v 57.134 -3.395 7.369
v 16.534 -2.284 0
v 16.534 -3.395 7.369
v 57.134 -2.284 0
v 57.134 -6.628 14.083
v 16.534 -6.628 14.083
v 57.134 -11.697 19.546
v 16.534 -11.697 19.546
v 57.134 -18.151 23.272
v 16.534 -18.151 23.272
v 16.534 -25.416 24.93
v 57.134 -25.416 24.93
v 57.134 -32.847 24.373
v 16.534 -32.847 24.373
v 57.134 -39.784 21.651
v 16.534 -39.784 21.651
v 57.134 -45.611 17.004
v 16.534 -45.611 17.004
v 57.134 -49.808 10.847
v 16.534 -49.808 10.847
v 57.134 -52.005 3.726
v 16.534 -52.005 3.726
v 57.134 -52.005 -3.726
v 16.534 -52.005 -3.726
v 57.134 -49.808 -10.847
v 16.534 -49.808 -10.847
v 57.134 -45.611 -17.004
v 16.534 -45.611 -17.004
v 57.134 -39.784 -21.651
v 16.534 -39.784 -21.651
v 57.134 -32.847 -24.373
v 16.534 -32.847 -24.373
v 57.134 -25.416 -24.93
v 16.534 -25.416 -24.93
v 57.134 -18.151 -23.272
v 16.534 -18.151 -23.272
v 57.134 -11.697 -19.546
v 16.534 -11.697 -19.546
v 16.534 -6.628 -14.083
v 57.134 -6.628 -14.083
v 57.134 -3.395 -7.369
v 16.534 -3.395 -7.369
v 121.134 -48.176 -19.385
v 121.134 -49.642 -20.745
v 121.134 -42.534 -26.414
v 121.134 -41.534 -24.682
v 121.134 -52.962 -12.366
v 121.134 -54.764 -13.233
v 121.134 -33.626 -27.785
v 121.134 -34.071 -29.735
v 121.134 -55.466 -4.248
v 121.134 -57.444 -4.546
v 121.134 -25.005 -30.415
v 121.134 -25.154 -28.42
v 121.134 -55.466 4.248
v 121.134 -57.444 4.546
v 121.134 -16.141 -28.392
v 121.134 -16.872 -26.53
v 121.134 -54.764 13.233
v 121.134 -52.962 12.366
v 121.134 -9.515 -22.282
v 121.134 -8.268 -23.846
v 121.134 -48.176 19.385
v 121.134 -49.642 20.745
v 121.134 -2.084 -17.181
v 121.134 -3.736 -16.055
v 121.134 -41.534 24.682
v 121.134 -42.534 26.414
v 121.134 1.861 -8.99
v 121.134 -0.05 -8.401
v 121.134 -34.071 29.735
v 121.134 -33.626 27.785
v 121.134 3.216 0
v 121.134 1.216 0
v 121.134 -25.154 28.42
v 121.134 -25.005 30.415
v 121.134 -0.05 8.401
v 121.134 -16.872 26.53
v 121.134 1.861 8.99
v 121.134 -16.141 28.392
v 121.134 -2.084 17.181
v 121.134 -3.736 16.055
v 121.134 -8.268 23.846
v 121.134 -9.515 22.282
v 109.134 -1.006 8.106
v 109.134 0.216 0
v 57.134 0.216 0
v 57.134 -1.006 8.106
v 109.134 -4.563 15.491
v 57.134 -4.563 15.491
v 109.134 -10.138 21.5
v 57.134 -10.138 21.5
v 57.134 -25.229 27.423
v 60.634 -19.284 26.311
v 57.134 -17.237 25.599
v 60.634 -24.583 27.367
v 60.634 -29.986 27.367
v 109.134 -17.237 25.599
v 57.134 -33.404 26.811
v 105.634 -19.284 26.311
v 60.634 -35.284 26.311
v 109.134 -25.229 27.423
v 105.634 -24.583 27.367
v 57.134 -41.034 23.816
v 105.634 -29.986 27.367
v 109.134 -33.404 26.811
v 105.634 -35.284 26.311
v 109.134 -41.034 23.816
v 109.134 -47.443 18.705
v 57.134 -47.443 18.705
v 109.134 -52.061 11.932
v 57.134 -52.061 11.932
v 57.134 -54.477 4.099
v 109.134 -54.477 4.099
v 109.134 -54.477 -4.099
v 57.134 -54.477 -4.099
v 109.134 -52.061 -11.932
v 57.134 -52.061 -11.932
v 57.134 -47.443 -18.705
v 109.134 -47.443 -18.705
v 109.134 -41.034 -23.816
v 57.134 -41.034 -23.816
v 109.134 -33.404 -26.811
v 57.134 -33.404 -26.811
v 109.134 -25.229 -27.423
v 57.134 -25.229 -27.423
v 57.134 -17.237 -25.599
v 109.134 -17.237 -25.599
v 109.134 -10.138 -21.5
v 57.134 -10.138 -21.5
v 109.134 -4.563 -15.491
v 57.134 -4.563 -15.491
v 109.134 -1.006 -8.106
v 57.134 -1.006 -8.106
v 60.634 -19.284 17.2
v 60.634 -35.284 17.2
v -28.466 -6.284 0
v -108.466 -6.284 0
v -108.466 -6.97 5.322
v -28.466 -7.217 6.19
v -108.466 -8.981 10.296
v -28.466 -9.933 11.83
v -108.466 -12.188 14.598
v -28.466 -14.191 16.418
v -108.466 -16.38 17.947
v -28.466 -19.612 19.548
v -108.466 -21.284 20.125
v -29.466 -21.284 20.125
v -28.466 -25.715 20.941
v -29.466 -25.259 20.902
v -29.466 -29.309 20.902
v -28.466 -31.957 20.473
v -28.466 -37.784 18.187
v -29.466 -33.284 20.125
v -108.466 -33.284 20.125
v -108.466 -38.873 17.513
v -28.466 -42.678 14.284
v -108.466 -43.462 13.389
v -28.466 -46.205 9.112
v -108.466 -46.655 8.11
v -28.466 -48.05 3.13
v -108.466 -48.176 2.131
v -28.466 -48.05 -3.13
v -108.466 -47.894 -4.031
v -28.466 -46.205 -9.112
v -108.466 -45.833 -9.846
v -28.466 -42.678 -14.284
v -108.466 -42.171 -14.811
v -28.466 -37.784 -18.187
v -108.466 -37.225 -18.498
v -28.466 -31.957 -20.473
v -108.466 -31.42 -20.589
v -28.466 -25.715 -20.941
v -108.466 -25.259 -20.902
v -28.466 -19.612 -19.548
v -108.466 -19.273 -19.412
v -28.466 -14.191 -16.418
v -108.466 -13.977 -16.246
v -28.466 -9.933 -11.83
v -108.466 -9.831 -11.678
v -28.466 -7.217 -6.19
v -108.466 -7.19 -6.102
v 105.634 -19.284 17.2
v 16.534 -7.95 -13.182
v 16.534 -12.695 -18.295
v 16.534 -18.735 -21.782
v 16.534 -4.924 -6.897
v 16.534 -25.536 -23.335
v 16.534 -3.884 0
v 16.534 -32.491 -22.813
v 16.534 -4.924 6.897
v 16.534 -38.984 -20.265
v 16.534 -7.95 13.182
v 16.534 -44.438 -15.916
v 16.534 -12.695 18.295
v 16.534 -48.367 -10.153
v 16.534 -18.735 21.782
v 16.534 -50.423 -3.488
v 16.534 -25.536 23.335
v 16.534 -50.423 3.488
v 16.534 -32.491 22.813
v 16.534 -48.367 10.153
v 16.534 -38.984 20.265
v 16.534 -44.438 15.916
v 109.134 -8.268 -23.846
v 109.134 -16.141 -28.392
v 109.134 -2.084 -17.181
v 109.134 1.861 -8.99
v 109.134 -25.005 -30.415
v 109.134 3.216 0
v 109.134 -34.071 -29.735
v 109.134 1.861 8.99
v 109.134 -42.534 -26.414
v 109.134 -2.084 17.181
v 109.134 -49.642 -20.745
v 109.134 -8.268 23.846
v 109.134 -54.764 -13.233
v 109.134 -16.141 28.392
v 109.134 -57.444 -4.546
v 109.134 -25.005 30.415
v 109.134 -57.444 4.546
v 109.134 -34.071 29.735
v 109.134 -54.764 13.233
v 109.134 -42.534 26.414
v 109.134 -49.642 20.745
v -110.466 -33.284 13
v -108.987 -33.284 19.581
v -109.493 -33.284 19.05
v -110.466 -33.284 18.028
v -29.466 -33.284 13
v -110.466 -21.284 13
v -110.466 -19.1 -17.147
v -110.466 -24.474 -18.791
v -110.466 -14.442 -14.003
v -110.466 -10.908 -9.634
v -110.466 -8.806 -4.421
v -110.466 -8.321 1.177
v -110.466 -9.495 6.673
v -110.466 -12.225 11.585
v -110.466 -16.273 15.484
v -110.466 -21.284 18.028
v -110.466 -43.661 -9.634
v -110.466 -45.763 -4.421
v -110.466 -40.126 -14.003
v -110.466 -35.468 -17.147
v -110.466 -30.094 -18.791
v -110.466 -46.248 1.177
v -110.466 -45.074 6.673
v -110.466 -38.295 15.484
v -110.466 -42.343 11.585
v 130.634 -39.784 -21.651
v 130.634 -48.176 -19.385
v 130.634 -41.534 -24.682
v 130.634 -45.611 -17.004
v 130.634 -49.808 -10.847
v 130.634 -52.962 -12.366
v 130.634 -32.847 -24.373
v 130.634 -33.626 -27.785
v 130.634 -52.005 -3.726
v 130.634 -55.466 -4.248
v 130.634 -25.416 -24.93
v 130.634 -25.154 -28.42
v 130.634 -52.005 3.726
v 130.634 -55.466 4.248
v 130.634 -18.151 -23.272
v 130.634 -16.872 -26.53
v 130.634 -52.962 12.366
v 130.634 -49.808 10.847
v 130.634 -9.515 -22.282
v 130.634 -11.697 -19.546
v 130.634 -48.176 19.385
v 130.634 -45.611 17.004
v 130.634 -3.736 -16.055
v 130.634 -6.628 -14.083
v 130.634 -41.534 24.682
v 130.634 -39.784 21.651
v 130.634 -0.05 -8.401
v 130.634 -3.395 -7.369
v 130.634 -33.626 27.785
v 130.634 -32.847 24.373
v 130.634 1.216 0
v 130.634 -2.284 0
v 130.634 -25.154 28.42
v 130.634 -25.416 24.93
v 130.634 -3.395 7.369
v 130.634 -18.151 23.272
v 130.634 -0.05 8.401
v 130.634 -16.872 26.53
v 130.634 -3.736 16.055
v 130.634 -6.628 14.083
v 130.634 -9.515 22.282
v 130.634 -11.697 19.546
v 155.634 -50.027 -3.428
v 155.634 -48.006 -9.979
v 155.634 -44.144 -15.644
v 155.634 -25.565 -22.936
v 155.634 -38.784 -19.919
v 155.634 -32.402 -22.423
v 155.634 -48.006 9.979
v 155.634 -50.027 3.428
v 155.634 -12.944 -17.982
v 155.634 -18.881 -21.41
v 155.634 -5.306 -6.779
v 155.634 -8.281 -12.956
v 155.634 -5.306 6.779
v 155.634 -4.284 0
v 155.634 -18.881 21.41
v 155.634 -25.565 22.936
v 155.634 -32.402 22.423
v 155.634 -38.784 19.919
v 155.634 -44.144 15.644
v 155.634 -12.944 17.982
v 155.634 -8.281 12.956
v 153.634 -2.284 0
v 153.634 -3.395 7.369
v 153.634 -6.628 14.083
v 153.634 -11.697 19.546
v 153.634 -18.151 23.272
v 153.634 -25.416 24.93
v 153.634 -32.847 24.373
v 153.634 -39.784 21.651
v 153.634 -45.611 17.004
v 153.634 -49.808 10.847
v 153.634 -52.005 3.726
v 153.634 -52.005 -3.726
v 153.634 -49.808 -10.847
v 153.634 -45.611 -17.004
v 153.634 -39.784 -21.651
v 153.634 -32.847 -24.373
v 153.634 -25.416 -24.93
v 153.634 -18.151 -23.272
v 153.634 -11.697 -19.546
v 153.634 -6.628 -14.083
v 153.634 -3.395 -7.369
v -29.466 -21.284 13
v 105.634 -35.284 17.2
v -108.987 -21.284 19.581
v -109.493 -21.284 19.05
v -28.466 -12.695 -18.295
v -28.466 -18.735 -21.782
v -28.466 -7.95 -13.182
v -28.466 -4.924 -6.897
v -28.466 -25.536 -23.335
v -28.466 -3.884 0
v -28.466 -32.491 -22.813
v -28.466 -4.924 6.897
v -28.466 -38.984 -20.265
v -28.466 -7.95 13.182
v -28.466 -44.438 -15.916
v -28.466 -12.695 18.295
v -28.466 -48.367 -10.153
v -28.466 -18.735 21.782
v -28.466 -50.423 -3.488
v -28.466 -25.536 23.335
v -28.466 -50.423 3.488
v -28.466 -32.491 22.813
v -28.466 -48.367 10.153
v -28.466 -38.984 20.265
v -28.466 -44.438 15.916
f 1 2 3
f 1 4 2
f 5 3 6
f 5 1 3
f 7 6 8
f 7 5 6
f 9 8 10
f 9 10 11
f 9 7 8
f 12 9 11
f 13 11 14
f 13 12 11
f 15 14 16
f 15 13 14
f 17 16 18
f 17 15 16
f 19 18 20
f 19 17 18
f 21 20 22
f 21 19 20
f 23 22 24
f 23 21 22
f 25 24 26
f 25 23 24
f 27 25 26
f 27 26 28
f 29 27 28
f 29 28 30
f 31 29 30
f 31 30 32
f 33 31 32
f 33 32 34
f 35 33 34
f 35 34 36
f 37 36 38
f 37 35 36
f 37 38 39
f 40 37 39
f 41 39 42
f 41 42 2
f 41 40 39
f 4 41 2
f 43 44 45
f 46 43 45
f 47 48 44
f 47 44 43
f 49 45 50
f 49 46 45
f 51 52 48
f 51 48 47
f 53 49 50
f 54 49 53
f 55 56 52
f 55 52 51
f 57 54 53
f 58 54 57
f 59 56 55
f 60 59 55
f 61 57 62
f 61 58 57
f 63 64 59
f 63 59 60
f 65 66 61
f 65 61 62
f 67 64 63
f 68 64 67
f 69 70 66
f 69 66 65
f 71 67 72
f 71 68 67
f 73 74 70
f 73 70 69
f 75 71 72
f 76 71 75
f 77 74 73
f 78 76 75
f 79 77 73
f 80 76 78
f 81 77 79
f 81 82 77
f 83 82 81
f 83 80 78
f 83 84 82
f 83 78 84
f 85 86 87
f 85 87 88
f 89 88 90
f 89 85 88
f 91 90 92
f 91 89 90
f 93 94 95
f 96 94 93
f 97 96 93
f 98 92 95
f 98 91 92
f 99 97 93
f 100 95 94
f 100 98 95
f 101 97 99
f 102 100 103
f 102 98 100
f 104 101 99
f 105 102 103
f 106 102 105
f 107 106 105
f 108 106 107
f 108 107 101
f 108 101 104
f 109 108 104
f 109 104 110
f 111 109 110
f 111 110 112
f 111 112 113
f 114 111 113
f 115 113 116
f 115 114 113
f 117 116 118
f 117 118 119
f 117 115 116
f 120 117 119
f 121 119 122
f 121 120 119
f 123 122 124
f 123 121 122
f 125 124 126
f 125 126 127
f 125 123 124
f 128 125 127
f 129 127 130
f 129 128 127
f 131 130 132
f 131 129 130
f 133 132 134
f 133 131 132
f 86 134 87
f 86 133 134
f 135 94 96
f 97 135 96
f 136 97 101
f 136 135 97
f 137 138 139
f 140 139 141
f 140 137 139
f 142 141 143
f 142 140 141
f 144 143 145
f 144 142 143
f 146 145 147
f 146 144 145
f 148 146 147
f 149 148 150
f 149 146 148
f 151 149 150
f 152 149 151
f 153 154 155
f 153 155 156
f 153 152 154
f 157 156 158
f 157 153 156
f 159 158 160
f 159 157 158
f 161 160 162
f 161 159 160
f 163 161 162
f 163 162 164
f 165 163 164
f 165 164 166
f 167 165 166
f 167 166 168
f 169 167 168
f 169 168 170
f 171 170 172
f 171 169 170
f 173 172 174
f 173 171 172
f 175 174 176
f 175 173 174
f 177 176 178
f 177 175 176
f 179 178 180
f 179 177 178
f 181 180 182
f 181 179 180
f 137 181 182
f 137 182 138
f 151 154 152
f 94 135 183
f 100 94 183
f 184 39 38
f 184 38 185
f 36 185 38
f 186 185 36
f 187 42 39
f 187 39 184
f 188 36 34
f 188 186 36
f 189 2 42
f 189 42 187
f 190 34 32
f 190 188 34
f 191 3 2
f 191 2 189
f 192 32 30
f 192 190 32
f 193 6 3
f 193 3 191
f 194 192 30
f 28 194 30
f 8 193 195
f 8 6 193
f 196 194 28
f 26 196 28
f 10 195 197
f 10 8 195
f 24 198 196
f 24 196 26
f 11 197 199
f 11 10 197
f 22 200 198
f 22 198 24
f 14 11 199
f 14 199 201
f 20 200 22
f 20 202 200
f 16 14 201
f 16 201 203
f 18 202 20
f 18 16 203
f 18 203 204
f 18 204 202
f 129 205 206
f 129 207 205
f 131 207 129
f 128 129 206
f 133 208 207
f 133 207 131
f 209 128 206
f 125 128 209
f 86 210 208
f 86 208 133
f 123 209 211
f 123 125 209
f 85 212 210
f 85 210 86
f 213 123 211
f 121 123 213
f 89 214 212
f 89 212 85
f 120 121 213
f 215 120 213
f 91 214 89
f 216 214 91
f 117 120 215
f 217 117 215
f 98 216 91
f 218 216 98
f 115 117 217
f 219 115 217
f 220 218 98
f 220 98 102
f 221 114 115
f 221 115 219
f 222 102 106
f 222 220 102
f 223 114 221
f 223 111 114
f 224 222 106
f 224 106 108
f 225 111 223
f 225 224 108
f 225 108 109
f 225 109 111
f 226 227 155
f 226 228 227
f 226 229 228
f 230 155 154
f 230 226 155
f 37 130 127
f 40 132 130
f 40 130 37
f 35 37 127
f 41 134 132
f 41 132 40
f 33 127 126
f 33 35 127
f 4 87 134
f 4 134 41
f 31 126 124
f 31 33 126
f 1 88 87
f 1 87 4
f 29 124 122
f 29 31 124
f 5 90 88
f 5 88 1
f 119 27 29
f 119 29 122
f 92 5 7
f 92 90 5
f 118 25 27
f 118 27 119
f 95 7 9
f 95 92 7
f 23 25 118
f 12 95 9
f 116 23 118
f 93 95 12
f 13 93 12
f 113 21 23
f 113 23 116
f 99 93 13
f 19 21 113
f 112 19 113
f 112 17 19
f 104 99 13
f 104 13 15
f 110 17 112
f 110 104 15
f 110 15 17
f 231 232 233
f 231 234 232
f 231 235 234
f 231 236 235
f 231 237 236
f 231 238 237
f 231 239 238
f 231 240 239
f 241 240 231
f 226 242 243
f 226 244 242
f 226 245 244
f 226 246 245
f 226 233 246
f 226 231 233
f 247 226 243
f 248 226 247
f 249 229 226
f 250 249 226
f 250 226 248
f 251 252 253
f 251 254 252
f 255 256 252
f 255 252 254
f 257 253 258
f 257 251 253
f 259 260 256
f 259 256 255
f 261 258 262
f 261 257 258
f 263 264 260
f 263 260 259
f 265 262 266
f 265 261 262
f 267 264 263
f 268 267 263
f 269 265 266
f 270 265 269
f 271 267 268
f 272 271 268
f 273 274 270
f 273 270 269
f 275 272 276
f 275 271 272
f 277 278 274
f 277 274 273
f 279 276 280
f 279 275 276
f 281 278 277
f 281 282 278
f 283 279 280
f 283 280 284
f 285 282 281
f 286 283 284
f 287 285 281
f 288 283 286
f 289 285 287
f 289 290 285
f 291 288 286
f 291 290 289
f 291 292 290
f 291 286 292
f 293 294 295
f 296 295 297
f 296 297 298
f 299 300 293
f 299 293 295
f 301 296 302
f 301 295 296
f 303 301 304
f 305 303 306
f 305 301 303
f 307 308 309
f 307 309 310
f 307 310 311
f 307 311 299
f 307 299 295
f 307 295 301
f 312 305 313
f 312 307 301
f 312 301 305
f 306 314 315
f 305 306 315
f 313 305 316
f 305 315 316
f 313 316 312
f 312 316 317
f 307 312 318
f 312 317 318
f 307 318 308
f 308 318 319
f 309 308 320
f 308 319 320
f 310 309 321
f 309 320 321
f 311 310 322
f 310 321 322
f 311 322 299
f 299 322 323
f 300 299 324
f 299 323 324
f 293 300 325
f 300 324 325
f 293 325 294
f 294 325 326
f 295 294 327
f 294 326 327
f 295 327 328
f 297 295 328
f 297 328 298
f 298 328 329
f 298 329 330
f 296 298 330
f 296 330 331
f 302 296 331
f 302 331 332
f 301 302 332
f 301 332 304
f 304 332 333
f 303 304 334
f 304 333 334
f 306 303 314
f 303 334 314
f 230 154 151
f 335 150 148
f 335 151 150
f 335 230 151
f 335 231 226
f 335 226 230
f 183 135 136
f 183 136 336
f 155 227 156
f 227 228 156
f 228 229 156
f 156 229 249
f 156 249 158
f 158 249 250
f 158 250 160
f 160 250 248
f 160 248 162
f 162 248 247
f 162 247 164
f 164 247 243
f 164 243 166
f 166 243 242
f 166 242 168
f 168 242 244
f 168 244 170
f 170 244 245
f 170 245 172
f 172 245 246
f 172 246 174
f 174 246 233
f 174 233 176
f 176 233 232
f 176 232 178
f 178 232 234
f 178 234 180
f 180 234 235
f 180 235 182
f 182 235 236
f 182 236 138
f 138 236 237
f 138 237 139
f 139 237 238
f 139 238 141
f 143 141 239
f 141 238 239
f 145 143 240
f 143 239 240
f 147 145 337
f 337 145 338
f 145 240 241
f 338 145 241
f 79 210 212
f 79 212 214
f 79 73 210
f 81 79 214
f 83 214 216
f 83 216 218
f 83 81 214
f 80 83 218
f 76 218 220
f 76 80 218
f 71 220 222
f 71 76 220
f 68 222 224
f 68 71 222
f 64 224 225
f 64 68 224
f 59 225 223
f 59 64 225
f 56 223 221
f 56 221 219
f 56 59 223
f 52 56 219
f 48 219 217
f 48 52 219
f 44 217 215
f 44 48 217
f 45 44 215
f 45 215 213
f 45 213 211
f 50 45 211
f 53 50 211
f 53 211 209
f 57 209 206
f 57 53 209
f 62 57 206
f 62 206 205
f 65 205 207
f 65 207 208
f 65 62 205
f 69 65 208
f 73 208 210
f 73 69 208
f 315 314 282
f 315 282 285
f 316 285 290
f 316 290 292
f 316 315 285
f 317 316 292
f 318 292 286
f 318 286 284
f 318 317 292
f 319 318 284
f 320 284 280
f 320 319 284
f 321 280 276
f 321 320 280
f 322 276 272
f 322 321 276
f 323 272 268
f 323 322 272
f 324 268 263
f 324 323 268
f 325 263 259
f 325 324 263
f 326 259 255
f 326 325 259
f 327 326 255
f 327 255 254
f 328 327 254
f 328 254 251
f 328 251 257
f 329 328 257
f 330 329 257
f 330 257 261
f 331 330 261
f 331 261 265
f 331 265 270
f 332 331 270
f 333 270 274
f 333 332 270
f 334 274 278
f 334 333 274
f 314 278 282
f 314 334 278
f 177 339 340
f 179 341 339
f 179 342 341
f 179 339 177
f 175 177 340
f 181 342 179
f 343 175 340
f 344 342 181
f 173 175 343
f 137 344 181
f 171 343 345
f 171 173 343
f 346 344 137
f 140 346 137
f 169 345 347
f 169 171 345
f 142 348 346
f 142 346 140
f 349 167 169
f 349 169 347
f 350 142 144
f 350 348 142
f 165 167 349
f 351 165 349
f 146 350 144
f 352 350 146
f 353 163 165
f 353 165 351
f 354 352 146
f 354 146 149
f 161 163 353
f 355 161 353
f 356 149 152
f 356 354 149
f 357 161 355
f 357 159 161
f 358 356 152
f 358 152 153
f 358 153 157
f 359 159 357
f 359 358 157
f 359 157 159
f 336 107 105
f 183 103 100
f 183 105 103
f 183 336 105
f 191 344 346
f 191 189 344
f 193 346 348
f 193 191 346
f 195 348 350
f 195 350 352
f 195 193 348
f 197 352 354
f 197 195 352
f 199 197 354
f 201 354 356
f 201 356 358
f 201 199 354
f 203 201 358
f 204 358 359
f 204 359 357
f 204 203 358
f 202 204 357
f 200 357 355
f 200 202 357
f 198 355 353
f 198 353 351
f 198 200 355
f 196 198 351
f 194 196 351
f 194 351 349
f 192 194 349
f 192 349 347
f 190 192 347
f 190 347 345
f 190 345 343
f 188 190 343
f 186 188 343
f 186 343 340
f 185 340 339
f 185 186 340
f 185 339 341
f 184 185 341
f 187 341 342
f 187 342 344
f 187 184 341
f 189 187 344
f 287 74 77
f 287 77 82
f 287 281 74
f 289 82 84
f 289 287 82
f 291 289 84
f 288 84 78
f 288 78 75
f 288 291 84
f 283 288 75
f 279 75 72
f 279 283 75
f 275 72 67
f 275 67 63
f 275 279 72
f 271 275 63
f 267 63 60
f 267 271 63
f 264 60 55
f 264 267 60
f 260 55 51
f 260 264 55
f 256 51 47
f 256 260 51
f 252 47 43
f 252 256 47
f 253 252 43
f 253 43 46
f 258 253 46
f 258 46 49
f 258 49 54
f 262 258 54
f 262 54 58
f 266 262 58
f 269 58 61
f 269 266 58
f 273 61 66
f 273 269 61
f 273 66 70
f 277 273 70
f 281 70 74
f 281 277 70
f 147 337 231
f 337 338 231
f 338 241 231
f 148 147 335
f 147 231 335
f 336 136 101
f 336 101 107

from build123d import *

# Parameters (mm, degrees)
CUT_EXTRUDE_START   = 17.2
SKETCH_9_W          = 45
SKETCH_9_H          = 8
CUT_EXTRUDE_1_DEPTH = 36
CUT_EXTRUDE_START_2 = 13
SKETCH_12_W         = 81
SKETCH_12_H         = 6
CUT_EXTRUDE_4_DEPTH = 35
CHAMFER_1_SIZE      = 2


# Read off the part's stored shape, not the designer's step: 旋转3
with BuildPart() as part:
    # 旋转3 outline → 旋转3 (revolve)
    with BuildSketch(Plane(origin=(0, -27.284213334, 0), x_dir=(0, 1, 0), z_dir=(0, 0, -1))):
        Polygon((25, 155.634128986), (0, 155.634128986), (0, -110.465871014), (21, -110.465871014), (21, -28.465871014), (23.4, -28.465871014), (23.4, 16.534128986), (25, 16.534128986), (25, 57.134128986), (27.5, 57.134128986), (27.5, 109.134128986), (30.5, 109.134128986), (30.5, 121.134128986), (28.5, 121.134128986), (28.5, 130.634128986), (25, 130.634128986), align=None)
    revolve(axis=Axis((0, -27.284213334, 0), (1, 0, 0)))

    # 草图9 → 切除-拉伸1 (cut)
    with BuildSketch(Plane.XY.offset(CUT_EXTRUDE_START)):
        with Locations((83.134128986, -23.284213334)):
            Rectangle(SKETCH_9_W, SKETCH_9_H)
        with Locations((83.134128986, -31.284213334)):
            Rectangle(SKETCH_9_W, SKETCH_9_H)
    extrude(amount=CUT_EXTRUDE_1_DEPTH, mode=Mode.SUBTRACT)

    # 草图12 → 切除-拉伸4 (cut)
    with BuildSketch(Plane.XY.offset(CUT_EXTRUDE_START_2)):
        with Locations((-69.965871014, -24.284213334)):
            Rectangle(SKETCH_12_W, SKETCH_12_H)
        with Locations((-69.965871014, -30.284213334)):
            Rectangle(SKETCH_12_W, SKETCH_12_H)
    extrude(amount=CUT_EXTRUDE_4_DEPTH, mode=Mode.SUBTRACT)

    # 倒角1
    chamfer_1_edges = [part.edges().sort_by_distance(p)[0] for p in [
        (-110.465871014, -39.834113732, -16.837458241),
        (155.634128986, -52.284213334, 0),
    ]]
    chamfer(chamfer_1_edges, length=CHAMFER_1_SIZE)


solid = part.part
